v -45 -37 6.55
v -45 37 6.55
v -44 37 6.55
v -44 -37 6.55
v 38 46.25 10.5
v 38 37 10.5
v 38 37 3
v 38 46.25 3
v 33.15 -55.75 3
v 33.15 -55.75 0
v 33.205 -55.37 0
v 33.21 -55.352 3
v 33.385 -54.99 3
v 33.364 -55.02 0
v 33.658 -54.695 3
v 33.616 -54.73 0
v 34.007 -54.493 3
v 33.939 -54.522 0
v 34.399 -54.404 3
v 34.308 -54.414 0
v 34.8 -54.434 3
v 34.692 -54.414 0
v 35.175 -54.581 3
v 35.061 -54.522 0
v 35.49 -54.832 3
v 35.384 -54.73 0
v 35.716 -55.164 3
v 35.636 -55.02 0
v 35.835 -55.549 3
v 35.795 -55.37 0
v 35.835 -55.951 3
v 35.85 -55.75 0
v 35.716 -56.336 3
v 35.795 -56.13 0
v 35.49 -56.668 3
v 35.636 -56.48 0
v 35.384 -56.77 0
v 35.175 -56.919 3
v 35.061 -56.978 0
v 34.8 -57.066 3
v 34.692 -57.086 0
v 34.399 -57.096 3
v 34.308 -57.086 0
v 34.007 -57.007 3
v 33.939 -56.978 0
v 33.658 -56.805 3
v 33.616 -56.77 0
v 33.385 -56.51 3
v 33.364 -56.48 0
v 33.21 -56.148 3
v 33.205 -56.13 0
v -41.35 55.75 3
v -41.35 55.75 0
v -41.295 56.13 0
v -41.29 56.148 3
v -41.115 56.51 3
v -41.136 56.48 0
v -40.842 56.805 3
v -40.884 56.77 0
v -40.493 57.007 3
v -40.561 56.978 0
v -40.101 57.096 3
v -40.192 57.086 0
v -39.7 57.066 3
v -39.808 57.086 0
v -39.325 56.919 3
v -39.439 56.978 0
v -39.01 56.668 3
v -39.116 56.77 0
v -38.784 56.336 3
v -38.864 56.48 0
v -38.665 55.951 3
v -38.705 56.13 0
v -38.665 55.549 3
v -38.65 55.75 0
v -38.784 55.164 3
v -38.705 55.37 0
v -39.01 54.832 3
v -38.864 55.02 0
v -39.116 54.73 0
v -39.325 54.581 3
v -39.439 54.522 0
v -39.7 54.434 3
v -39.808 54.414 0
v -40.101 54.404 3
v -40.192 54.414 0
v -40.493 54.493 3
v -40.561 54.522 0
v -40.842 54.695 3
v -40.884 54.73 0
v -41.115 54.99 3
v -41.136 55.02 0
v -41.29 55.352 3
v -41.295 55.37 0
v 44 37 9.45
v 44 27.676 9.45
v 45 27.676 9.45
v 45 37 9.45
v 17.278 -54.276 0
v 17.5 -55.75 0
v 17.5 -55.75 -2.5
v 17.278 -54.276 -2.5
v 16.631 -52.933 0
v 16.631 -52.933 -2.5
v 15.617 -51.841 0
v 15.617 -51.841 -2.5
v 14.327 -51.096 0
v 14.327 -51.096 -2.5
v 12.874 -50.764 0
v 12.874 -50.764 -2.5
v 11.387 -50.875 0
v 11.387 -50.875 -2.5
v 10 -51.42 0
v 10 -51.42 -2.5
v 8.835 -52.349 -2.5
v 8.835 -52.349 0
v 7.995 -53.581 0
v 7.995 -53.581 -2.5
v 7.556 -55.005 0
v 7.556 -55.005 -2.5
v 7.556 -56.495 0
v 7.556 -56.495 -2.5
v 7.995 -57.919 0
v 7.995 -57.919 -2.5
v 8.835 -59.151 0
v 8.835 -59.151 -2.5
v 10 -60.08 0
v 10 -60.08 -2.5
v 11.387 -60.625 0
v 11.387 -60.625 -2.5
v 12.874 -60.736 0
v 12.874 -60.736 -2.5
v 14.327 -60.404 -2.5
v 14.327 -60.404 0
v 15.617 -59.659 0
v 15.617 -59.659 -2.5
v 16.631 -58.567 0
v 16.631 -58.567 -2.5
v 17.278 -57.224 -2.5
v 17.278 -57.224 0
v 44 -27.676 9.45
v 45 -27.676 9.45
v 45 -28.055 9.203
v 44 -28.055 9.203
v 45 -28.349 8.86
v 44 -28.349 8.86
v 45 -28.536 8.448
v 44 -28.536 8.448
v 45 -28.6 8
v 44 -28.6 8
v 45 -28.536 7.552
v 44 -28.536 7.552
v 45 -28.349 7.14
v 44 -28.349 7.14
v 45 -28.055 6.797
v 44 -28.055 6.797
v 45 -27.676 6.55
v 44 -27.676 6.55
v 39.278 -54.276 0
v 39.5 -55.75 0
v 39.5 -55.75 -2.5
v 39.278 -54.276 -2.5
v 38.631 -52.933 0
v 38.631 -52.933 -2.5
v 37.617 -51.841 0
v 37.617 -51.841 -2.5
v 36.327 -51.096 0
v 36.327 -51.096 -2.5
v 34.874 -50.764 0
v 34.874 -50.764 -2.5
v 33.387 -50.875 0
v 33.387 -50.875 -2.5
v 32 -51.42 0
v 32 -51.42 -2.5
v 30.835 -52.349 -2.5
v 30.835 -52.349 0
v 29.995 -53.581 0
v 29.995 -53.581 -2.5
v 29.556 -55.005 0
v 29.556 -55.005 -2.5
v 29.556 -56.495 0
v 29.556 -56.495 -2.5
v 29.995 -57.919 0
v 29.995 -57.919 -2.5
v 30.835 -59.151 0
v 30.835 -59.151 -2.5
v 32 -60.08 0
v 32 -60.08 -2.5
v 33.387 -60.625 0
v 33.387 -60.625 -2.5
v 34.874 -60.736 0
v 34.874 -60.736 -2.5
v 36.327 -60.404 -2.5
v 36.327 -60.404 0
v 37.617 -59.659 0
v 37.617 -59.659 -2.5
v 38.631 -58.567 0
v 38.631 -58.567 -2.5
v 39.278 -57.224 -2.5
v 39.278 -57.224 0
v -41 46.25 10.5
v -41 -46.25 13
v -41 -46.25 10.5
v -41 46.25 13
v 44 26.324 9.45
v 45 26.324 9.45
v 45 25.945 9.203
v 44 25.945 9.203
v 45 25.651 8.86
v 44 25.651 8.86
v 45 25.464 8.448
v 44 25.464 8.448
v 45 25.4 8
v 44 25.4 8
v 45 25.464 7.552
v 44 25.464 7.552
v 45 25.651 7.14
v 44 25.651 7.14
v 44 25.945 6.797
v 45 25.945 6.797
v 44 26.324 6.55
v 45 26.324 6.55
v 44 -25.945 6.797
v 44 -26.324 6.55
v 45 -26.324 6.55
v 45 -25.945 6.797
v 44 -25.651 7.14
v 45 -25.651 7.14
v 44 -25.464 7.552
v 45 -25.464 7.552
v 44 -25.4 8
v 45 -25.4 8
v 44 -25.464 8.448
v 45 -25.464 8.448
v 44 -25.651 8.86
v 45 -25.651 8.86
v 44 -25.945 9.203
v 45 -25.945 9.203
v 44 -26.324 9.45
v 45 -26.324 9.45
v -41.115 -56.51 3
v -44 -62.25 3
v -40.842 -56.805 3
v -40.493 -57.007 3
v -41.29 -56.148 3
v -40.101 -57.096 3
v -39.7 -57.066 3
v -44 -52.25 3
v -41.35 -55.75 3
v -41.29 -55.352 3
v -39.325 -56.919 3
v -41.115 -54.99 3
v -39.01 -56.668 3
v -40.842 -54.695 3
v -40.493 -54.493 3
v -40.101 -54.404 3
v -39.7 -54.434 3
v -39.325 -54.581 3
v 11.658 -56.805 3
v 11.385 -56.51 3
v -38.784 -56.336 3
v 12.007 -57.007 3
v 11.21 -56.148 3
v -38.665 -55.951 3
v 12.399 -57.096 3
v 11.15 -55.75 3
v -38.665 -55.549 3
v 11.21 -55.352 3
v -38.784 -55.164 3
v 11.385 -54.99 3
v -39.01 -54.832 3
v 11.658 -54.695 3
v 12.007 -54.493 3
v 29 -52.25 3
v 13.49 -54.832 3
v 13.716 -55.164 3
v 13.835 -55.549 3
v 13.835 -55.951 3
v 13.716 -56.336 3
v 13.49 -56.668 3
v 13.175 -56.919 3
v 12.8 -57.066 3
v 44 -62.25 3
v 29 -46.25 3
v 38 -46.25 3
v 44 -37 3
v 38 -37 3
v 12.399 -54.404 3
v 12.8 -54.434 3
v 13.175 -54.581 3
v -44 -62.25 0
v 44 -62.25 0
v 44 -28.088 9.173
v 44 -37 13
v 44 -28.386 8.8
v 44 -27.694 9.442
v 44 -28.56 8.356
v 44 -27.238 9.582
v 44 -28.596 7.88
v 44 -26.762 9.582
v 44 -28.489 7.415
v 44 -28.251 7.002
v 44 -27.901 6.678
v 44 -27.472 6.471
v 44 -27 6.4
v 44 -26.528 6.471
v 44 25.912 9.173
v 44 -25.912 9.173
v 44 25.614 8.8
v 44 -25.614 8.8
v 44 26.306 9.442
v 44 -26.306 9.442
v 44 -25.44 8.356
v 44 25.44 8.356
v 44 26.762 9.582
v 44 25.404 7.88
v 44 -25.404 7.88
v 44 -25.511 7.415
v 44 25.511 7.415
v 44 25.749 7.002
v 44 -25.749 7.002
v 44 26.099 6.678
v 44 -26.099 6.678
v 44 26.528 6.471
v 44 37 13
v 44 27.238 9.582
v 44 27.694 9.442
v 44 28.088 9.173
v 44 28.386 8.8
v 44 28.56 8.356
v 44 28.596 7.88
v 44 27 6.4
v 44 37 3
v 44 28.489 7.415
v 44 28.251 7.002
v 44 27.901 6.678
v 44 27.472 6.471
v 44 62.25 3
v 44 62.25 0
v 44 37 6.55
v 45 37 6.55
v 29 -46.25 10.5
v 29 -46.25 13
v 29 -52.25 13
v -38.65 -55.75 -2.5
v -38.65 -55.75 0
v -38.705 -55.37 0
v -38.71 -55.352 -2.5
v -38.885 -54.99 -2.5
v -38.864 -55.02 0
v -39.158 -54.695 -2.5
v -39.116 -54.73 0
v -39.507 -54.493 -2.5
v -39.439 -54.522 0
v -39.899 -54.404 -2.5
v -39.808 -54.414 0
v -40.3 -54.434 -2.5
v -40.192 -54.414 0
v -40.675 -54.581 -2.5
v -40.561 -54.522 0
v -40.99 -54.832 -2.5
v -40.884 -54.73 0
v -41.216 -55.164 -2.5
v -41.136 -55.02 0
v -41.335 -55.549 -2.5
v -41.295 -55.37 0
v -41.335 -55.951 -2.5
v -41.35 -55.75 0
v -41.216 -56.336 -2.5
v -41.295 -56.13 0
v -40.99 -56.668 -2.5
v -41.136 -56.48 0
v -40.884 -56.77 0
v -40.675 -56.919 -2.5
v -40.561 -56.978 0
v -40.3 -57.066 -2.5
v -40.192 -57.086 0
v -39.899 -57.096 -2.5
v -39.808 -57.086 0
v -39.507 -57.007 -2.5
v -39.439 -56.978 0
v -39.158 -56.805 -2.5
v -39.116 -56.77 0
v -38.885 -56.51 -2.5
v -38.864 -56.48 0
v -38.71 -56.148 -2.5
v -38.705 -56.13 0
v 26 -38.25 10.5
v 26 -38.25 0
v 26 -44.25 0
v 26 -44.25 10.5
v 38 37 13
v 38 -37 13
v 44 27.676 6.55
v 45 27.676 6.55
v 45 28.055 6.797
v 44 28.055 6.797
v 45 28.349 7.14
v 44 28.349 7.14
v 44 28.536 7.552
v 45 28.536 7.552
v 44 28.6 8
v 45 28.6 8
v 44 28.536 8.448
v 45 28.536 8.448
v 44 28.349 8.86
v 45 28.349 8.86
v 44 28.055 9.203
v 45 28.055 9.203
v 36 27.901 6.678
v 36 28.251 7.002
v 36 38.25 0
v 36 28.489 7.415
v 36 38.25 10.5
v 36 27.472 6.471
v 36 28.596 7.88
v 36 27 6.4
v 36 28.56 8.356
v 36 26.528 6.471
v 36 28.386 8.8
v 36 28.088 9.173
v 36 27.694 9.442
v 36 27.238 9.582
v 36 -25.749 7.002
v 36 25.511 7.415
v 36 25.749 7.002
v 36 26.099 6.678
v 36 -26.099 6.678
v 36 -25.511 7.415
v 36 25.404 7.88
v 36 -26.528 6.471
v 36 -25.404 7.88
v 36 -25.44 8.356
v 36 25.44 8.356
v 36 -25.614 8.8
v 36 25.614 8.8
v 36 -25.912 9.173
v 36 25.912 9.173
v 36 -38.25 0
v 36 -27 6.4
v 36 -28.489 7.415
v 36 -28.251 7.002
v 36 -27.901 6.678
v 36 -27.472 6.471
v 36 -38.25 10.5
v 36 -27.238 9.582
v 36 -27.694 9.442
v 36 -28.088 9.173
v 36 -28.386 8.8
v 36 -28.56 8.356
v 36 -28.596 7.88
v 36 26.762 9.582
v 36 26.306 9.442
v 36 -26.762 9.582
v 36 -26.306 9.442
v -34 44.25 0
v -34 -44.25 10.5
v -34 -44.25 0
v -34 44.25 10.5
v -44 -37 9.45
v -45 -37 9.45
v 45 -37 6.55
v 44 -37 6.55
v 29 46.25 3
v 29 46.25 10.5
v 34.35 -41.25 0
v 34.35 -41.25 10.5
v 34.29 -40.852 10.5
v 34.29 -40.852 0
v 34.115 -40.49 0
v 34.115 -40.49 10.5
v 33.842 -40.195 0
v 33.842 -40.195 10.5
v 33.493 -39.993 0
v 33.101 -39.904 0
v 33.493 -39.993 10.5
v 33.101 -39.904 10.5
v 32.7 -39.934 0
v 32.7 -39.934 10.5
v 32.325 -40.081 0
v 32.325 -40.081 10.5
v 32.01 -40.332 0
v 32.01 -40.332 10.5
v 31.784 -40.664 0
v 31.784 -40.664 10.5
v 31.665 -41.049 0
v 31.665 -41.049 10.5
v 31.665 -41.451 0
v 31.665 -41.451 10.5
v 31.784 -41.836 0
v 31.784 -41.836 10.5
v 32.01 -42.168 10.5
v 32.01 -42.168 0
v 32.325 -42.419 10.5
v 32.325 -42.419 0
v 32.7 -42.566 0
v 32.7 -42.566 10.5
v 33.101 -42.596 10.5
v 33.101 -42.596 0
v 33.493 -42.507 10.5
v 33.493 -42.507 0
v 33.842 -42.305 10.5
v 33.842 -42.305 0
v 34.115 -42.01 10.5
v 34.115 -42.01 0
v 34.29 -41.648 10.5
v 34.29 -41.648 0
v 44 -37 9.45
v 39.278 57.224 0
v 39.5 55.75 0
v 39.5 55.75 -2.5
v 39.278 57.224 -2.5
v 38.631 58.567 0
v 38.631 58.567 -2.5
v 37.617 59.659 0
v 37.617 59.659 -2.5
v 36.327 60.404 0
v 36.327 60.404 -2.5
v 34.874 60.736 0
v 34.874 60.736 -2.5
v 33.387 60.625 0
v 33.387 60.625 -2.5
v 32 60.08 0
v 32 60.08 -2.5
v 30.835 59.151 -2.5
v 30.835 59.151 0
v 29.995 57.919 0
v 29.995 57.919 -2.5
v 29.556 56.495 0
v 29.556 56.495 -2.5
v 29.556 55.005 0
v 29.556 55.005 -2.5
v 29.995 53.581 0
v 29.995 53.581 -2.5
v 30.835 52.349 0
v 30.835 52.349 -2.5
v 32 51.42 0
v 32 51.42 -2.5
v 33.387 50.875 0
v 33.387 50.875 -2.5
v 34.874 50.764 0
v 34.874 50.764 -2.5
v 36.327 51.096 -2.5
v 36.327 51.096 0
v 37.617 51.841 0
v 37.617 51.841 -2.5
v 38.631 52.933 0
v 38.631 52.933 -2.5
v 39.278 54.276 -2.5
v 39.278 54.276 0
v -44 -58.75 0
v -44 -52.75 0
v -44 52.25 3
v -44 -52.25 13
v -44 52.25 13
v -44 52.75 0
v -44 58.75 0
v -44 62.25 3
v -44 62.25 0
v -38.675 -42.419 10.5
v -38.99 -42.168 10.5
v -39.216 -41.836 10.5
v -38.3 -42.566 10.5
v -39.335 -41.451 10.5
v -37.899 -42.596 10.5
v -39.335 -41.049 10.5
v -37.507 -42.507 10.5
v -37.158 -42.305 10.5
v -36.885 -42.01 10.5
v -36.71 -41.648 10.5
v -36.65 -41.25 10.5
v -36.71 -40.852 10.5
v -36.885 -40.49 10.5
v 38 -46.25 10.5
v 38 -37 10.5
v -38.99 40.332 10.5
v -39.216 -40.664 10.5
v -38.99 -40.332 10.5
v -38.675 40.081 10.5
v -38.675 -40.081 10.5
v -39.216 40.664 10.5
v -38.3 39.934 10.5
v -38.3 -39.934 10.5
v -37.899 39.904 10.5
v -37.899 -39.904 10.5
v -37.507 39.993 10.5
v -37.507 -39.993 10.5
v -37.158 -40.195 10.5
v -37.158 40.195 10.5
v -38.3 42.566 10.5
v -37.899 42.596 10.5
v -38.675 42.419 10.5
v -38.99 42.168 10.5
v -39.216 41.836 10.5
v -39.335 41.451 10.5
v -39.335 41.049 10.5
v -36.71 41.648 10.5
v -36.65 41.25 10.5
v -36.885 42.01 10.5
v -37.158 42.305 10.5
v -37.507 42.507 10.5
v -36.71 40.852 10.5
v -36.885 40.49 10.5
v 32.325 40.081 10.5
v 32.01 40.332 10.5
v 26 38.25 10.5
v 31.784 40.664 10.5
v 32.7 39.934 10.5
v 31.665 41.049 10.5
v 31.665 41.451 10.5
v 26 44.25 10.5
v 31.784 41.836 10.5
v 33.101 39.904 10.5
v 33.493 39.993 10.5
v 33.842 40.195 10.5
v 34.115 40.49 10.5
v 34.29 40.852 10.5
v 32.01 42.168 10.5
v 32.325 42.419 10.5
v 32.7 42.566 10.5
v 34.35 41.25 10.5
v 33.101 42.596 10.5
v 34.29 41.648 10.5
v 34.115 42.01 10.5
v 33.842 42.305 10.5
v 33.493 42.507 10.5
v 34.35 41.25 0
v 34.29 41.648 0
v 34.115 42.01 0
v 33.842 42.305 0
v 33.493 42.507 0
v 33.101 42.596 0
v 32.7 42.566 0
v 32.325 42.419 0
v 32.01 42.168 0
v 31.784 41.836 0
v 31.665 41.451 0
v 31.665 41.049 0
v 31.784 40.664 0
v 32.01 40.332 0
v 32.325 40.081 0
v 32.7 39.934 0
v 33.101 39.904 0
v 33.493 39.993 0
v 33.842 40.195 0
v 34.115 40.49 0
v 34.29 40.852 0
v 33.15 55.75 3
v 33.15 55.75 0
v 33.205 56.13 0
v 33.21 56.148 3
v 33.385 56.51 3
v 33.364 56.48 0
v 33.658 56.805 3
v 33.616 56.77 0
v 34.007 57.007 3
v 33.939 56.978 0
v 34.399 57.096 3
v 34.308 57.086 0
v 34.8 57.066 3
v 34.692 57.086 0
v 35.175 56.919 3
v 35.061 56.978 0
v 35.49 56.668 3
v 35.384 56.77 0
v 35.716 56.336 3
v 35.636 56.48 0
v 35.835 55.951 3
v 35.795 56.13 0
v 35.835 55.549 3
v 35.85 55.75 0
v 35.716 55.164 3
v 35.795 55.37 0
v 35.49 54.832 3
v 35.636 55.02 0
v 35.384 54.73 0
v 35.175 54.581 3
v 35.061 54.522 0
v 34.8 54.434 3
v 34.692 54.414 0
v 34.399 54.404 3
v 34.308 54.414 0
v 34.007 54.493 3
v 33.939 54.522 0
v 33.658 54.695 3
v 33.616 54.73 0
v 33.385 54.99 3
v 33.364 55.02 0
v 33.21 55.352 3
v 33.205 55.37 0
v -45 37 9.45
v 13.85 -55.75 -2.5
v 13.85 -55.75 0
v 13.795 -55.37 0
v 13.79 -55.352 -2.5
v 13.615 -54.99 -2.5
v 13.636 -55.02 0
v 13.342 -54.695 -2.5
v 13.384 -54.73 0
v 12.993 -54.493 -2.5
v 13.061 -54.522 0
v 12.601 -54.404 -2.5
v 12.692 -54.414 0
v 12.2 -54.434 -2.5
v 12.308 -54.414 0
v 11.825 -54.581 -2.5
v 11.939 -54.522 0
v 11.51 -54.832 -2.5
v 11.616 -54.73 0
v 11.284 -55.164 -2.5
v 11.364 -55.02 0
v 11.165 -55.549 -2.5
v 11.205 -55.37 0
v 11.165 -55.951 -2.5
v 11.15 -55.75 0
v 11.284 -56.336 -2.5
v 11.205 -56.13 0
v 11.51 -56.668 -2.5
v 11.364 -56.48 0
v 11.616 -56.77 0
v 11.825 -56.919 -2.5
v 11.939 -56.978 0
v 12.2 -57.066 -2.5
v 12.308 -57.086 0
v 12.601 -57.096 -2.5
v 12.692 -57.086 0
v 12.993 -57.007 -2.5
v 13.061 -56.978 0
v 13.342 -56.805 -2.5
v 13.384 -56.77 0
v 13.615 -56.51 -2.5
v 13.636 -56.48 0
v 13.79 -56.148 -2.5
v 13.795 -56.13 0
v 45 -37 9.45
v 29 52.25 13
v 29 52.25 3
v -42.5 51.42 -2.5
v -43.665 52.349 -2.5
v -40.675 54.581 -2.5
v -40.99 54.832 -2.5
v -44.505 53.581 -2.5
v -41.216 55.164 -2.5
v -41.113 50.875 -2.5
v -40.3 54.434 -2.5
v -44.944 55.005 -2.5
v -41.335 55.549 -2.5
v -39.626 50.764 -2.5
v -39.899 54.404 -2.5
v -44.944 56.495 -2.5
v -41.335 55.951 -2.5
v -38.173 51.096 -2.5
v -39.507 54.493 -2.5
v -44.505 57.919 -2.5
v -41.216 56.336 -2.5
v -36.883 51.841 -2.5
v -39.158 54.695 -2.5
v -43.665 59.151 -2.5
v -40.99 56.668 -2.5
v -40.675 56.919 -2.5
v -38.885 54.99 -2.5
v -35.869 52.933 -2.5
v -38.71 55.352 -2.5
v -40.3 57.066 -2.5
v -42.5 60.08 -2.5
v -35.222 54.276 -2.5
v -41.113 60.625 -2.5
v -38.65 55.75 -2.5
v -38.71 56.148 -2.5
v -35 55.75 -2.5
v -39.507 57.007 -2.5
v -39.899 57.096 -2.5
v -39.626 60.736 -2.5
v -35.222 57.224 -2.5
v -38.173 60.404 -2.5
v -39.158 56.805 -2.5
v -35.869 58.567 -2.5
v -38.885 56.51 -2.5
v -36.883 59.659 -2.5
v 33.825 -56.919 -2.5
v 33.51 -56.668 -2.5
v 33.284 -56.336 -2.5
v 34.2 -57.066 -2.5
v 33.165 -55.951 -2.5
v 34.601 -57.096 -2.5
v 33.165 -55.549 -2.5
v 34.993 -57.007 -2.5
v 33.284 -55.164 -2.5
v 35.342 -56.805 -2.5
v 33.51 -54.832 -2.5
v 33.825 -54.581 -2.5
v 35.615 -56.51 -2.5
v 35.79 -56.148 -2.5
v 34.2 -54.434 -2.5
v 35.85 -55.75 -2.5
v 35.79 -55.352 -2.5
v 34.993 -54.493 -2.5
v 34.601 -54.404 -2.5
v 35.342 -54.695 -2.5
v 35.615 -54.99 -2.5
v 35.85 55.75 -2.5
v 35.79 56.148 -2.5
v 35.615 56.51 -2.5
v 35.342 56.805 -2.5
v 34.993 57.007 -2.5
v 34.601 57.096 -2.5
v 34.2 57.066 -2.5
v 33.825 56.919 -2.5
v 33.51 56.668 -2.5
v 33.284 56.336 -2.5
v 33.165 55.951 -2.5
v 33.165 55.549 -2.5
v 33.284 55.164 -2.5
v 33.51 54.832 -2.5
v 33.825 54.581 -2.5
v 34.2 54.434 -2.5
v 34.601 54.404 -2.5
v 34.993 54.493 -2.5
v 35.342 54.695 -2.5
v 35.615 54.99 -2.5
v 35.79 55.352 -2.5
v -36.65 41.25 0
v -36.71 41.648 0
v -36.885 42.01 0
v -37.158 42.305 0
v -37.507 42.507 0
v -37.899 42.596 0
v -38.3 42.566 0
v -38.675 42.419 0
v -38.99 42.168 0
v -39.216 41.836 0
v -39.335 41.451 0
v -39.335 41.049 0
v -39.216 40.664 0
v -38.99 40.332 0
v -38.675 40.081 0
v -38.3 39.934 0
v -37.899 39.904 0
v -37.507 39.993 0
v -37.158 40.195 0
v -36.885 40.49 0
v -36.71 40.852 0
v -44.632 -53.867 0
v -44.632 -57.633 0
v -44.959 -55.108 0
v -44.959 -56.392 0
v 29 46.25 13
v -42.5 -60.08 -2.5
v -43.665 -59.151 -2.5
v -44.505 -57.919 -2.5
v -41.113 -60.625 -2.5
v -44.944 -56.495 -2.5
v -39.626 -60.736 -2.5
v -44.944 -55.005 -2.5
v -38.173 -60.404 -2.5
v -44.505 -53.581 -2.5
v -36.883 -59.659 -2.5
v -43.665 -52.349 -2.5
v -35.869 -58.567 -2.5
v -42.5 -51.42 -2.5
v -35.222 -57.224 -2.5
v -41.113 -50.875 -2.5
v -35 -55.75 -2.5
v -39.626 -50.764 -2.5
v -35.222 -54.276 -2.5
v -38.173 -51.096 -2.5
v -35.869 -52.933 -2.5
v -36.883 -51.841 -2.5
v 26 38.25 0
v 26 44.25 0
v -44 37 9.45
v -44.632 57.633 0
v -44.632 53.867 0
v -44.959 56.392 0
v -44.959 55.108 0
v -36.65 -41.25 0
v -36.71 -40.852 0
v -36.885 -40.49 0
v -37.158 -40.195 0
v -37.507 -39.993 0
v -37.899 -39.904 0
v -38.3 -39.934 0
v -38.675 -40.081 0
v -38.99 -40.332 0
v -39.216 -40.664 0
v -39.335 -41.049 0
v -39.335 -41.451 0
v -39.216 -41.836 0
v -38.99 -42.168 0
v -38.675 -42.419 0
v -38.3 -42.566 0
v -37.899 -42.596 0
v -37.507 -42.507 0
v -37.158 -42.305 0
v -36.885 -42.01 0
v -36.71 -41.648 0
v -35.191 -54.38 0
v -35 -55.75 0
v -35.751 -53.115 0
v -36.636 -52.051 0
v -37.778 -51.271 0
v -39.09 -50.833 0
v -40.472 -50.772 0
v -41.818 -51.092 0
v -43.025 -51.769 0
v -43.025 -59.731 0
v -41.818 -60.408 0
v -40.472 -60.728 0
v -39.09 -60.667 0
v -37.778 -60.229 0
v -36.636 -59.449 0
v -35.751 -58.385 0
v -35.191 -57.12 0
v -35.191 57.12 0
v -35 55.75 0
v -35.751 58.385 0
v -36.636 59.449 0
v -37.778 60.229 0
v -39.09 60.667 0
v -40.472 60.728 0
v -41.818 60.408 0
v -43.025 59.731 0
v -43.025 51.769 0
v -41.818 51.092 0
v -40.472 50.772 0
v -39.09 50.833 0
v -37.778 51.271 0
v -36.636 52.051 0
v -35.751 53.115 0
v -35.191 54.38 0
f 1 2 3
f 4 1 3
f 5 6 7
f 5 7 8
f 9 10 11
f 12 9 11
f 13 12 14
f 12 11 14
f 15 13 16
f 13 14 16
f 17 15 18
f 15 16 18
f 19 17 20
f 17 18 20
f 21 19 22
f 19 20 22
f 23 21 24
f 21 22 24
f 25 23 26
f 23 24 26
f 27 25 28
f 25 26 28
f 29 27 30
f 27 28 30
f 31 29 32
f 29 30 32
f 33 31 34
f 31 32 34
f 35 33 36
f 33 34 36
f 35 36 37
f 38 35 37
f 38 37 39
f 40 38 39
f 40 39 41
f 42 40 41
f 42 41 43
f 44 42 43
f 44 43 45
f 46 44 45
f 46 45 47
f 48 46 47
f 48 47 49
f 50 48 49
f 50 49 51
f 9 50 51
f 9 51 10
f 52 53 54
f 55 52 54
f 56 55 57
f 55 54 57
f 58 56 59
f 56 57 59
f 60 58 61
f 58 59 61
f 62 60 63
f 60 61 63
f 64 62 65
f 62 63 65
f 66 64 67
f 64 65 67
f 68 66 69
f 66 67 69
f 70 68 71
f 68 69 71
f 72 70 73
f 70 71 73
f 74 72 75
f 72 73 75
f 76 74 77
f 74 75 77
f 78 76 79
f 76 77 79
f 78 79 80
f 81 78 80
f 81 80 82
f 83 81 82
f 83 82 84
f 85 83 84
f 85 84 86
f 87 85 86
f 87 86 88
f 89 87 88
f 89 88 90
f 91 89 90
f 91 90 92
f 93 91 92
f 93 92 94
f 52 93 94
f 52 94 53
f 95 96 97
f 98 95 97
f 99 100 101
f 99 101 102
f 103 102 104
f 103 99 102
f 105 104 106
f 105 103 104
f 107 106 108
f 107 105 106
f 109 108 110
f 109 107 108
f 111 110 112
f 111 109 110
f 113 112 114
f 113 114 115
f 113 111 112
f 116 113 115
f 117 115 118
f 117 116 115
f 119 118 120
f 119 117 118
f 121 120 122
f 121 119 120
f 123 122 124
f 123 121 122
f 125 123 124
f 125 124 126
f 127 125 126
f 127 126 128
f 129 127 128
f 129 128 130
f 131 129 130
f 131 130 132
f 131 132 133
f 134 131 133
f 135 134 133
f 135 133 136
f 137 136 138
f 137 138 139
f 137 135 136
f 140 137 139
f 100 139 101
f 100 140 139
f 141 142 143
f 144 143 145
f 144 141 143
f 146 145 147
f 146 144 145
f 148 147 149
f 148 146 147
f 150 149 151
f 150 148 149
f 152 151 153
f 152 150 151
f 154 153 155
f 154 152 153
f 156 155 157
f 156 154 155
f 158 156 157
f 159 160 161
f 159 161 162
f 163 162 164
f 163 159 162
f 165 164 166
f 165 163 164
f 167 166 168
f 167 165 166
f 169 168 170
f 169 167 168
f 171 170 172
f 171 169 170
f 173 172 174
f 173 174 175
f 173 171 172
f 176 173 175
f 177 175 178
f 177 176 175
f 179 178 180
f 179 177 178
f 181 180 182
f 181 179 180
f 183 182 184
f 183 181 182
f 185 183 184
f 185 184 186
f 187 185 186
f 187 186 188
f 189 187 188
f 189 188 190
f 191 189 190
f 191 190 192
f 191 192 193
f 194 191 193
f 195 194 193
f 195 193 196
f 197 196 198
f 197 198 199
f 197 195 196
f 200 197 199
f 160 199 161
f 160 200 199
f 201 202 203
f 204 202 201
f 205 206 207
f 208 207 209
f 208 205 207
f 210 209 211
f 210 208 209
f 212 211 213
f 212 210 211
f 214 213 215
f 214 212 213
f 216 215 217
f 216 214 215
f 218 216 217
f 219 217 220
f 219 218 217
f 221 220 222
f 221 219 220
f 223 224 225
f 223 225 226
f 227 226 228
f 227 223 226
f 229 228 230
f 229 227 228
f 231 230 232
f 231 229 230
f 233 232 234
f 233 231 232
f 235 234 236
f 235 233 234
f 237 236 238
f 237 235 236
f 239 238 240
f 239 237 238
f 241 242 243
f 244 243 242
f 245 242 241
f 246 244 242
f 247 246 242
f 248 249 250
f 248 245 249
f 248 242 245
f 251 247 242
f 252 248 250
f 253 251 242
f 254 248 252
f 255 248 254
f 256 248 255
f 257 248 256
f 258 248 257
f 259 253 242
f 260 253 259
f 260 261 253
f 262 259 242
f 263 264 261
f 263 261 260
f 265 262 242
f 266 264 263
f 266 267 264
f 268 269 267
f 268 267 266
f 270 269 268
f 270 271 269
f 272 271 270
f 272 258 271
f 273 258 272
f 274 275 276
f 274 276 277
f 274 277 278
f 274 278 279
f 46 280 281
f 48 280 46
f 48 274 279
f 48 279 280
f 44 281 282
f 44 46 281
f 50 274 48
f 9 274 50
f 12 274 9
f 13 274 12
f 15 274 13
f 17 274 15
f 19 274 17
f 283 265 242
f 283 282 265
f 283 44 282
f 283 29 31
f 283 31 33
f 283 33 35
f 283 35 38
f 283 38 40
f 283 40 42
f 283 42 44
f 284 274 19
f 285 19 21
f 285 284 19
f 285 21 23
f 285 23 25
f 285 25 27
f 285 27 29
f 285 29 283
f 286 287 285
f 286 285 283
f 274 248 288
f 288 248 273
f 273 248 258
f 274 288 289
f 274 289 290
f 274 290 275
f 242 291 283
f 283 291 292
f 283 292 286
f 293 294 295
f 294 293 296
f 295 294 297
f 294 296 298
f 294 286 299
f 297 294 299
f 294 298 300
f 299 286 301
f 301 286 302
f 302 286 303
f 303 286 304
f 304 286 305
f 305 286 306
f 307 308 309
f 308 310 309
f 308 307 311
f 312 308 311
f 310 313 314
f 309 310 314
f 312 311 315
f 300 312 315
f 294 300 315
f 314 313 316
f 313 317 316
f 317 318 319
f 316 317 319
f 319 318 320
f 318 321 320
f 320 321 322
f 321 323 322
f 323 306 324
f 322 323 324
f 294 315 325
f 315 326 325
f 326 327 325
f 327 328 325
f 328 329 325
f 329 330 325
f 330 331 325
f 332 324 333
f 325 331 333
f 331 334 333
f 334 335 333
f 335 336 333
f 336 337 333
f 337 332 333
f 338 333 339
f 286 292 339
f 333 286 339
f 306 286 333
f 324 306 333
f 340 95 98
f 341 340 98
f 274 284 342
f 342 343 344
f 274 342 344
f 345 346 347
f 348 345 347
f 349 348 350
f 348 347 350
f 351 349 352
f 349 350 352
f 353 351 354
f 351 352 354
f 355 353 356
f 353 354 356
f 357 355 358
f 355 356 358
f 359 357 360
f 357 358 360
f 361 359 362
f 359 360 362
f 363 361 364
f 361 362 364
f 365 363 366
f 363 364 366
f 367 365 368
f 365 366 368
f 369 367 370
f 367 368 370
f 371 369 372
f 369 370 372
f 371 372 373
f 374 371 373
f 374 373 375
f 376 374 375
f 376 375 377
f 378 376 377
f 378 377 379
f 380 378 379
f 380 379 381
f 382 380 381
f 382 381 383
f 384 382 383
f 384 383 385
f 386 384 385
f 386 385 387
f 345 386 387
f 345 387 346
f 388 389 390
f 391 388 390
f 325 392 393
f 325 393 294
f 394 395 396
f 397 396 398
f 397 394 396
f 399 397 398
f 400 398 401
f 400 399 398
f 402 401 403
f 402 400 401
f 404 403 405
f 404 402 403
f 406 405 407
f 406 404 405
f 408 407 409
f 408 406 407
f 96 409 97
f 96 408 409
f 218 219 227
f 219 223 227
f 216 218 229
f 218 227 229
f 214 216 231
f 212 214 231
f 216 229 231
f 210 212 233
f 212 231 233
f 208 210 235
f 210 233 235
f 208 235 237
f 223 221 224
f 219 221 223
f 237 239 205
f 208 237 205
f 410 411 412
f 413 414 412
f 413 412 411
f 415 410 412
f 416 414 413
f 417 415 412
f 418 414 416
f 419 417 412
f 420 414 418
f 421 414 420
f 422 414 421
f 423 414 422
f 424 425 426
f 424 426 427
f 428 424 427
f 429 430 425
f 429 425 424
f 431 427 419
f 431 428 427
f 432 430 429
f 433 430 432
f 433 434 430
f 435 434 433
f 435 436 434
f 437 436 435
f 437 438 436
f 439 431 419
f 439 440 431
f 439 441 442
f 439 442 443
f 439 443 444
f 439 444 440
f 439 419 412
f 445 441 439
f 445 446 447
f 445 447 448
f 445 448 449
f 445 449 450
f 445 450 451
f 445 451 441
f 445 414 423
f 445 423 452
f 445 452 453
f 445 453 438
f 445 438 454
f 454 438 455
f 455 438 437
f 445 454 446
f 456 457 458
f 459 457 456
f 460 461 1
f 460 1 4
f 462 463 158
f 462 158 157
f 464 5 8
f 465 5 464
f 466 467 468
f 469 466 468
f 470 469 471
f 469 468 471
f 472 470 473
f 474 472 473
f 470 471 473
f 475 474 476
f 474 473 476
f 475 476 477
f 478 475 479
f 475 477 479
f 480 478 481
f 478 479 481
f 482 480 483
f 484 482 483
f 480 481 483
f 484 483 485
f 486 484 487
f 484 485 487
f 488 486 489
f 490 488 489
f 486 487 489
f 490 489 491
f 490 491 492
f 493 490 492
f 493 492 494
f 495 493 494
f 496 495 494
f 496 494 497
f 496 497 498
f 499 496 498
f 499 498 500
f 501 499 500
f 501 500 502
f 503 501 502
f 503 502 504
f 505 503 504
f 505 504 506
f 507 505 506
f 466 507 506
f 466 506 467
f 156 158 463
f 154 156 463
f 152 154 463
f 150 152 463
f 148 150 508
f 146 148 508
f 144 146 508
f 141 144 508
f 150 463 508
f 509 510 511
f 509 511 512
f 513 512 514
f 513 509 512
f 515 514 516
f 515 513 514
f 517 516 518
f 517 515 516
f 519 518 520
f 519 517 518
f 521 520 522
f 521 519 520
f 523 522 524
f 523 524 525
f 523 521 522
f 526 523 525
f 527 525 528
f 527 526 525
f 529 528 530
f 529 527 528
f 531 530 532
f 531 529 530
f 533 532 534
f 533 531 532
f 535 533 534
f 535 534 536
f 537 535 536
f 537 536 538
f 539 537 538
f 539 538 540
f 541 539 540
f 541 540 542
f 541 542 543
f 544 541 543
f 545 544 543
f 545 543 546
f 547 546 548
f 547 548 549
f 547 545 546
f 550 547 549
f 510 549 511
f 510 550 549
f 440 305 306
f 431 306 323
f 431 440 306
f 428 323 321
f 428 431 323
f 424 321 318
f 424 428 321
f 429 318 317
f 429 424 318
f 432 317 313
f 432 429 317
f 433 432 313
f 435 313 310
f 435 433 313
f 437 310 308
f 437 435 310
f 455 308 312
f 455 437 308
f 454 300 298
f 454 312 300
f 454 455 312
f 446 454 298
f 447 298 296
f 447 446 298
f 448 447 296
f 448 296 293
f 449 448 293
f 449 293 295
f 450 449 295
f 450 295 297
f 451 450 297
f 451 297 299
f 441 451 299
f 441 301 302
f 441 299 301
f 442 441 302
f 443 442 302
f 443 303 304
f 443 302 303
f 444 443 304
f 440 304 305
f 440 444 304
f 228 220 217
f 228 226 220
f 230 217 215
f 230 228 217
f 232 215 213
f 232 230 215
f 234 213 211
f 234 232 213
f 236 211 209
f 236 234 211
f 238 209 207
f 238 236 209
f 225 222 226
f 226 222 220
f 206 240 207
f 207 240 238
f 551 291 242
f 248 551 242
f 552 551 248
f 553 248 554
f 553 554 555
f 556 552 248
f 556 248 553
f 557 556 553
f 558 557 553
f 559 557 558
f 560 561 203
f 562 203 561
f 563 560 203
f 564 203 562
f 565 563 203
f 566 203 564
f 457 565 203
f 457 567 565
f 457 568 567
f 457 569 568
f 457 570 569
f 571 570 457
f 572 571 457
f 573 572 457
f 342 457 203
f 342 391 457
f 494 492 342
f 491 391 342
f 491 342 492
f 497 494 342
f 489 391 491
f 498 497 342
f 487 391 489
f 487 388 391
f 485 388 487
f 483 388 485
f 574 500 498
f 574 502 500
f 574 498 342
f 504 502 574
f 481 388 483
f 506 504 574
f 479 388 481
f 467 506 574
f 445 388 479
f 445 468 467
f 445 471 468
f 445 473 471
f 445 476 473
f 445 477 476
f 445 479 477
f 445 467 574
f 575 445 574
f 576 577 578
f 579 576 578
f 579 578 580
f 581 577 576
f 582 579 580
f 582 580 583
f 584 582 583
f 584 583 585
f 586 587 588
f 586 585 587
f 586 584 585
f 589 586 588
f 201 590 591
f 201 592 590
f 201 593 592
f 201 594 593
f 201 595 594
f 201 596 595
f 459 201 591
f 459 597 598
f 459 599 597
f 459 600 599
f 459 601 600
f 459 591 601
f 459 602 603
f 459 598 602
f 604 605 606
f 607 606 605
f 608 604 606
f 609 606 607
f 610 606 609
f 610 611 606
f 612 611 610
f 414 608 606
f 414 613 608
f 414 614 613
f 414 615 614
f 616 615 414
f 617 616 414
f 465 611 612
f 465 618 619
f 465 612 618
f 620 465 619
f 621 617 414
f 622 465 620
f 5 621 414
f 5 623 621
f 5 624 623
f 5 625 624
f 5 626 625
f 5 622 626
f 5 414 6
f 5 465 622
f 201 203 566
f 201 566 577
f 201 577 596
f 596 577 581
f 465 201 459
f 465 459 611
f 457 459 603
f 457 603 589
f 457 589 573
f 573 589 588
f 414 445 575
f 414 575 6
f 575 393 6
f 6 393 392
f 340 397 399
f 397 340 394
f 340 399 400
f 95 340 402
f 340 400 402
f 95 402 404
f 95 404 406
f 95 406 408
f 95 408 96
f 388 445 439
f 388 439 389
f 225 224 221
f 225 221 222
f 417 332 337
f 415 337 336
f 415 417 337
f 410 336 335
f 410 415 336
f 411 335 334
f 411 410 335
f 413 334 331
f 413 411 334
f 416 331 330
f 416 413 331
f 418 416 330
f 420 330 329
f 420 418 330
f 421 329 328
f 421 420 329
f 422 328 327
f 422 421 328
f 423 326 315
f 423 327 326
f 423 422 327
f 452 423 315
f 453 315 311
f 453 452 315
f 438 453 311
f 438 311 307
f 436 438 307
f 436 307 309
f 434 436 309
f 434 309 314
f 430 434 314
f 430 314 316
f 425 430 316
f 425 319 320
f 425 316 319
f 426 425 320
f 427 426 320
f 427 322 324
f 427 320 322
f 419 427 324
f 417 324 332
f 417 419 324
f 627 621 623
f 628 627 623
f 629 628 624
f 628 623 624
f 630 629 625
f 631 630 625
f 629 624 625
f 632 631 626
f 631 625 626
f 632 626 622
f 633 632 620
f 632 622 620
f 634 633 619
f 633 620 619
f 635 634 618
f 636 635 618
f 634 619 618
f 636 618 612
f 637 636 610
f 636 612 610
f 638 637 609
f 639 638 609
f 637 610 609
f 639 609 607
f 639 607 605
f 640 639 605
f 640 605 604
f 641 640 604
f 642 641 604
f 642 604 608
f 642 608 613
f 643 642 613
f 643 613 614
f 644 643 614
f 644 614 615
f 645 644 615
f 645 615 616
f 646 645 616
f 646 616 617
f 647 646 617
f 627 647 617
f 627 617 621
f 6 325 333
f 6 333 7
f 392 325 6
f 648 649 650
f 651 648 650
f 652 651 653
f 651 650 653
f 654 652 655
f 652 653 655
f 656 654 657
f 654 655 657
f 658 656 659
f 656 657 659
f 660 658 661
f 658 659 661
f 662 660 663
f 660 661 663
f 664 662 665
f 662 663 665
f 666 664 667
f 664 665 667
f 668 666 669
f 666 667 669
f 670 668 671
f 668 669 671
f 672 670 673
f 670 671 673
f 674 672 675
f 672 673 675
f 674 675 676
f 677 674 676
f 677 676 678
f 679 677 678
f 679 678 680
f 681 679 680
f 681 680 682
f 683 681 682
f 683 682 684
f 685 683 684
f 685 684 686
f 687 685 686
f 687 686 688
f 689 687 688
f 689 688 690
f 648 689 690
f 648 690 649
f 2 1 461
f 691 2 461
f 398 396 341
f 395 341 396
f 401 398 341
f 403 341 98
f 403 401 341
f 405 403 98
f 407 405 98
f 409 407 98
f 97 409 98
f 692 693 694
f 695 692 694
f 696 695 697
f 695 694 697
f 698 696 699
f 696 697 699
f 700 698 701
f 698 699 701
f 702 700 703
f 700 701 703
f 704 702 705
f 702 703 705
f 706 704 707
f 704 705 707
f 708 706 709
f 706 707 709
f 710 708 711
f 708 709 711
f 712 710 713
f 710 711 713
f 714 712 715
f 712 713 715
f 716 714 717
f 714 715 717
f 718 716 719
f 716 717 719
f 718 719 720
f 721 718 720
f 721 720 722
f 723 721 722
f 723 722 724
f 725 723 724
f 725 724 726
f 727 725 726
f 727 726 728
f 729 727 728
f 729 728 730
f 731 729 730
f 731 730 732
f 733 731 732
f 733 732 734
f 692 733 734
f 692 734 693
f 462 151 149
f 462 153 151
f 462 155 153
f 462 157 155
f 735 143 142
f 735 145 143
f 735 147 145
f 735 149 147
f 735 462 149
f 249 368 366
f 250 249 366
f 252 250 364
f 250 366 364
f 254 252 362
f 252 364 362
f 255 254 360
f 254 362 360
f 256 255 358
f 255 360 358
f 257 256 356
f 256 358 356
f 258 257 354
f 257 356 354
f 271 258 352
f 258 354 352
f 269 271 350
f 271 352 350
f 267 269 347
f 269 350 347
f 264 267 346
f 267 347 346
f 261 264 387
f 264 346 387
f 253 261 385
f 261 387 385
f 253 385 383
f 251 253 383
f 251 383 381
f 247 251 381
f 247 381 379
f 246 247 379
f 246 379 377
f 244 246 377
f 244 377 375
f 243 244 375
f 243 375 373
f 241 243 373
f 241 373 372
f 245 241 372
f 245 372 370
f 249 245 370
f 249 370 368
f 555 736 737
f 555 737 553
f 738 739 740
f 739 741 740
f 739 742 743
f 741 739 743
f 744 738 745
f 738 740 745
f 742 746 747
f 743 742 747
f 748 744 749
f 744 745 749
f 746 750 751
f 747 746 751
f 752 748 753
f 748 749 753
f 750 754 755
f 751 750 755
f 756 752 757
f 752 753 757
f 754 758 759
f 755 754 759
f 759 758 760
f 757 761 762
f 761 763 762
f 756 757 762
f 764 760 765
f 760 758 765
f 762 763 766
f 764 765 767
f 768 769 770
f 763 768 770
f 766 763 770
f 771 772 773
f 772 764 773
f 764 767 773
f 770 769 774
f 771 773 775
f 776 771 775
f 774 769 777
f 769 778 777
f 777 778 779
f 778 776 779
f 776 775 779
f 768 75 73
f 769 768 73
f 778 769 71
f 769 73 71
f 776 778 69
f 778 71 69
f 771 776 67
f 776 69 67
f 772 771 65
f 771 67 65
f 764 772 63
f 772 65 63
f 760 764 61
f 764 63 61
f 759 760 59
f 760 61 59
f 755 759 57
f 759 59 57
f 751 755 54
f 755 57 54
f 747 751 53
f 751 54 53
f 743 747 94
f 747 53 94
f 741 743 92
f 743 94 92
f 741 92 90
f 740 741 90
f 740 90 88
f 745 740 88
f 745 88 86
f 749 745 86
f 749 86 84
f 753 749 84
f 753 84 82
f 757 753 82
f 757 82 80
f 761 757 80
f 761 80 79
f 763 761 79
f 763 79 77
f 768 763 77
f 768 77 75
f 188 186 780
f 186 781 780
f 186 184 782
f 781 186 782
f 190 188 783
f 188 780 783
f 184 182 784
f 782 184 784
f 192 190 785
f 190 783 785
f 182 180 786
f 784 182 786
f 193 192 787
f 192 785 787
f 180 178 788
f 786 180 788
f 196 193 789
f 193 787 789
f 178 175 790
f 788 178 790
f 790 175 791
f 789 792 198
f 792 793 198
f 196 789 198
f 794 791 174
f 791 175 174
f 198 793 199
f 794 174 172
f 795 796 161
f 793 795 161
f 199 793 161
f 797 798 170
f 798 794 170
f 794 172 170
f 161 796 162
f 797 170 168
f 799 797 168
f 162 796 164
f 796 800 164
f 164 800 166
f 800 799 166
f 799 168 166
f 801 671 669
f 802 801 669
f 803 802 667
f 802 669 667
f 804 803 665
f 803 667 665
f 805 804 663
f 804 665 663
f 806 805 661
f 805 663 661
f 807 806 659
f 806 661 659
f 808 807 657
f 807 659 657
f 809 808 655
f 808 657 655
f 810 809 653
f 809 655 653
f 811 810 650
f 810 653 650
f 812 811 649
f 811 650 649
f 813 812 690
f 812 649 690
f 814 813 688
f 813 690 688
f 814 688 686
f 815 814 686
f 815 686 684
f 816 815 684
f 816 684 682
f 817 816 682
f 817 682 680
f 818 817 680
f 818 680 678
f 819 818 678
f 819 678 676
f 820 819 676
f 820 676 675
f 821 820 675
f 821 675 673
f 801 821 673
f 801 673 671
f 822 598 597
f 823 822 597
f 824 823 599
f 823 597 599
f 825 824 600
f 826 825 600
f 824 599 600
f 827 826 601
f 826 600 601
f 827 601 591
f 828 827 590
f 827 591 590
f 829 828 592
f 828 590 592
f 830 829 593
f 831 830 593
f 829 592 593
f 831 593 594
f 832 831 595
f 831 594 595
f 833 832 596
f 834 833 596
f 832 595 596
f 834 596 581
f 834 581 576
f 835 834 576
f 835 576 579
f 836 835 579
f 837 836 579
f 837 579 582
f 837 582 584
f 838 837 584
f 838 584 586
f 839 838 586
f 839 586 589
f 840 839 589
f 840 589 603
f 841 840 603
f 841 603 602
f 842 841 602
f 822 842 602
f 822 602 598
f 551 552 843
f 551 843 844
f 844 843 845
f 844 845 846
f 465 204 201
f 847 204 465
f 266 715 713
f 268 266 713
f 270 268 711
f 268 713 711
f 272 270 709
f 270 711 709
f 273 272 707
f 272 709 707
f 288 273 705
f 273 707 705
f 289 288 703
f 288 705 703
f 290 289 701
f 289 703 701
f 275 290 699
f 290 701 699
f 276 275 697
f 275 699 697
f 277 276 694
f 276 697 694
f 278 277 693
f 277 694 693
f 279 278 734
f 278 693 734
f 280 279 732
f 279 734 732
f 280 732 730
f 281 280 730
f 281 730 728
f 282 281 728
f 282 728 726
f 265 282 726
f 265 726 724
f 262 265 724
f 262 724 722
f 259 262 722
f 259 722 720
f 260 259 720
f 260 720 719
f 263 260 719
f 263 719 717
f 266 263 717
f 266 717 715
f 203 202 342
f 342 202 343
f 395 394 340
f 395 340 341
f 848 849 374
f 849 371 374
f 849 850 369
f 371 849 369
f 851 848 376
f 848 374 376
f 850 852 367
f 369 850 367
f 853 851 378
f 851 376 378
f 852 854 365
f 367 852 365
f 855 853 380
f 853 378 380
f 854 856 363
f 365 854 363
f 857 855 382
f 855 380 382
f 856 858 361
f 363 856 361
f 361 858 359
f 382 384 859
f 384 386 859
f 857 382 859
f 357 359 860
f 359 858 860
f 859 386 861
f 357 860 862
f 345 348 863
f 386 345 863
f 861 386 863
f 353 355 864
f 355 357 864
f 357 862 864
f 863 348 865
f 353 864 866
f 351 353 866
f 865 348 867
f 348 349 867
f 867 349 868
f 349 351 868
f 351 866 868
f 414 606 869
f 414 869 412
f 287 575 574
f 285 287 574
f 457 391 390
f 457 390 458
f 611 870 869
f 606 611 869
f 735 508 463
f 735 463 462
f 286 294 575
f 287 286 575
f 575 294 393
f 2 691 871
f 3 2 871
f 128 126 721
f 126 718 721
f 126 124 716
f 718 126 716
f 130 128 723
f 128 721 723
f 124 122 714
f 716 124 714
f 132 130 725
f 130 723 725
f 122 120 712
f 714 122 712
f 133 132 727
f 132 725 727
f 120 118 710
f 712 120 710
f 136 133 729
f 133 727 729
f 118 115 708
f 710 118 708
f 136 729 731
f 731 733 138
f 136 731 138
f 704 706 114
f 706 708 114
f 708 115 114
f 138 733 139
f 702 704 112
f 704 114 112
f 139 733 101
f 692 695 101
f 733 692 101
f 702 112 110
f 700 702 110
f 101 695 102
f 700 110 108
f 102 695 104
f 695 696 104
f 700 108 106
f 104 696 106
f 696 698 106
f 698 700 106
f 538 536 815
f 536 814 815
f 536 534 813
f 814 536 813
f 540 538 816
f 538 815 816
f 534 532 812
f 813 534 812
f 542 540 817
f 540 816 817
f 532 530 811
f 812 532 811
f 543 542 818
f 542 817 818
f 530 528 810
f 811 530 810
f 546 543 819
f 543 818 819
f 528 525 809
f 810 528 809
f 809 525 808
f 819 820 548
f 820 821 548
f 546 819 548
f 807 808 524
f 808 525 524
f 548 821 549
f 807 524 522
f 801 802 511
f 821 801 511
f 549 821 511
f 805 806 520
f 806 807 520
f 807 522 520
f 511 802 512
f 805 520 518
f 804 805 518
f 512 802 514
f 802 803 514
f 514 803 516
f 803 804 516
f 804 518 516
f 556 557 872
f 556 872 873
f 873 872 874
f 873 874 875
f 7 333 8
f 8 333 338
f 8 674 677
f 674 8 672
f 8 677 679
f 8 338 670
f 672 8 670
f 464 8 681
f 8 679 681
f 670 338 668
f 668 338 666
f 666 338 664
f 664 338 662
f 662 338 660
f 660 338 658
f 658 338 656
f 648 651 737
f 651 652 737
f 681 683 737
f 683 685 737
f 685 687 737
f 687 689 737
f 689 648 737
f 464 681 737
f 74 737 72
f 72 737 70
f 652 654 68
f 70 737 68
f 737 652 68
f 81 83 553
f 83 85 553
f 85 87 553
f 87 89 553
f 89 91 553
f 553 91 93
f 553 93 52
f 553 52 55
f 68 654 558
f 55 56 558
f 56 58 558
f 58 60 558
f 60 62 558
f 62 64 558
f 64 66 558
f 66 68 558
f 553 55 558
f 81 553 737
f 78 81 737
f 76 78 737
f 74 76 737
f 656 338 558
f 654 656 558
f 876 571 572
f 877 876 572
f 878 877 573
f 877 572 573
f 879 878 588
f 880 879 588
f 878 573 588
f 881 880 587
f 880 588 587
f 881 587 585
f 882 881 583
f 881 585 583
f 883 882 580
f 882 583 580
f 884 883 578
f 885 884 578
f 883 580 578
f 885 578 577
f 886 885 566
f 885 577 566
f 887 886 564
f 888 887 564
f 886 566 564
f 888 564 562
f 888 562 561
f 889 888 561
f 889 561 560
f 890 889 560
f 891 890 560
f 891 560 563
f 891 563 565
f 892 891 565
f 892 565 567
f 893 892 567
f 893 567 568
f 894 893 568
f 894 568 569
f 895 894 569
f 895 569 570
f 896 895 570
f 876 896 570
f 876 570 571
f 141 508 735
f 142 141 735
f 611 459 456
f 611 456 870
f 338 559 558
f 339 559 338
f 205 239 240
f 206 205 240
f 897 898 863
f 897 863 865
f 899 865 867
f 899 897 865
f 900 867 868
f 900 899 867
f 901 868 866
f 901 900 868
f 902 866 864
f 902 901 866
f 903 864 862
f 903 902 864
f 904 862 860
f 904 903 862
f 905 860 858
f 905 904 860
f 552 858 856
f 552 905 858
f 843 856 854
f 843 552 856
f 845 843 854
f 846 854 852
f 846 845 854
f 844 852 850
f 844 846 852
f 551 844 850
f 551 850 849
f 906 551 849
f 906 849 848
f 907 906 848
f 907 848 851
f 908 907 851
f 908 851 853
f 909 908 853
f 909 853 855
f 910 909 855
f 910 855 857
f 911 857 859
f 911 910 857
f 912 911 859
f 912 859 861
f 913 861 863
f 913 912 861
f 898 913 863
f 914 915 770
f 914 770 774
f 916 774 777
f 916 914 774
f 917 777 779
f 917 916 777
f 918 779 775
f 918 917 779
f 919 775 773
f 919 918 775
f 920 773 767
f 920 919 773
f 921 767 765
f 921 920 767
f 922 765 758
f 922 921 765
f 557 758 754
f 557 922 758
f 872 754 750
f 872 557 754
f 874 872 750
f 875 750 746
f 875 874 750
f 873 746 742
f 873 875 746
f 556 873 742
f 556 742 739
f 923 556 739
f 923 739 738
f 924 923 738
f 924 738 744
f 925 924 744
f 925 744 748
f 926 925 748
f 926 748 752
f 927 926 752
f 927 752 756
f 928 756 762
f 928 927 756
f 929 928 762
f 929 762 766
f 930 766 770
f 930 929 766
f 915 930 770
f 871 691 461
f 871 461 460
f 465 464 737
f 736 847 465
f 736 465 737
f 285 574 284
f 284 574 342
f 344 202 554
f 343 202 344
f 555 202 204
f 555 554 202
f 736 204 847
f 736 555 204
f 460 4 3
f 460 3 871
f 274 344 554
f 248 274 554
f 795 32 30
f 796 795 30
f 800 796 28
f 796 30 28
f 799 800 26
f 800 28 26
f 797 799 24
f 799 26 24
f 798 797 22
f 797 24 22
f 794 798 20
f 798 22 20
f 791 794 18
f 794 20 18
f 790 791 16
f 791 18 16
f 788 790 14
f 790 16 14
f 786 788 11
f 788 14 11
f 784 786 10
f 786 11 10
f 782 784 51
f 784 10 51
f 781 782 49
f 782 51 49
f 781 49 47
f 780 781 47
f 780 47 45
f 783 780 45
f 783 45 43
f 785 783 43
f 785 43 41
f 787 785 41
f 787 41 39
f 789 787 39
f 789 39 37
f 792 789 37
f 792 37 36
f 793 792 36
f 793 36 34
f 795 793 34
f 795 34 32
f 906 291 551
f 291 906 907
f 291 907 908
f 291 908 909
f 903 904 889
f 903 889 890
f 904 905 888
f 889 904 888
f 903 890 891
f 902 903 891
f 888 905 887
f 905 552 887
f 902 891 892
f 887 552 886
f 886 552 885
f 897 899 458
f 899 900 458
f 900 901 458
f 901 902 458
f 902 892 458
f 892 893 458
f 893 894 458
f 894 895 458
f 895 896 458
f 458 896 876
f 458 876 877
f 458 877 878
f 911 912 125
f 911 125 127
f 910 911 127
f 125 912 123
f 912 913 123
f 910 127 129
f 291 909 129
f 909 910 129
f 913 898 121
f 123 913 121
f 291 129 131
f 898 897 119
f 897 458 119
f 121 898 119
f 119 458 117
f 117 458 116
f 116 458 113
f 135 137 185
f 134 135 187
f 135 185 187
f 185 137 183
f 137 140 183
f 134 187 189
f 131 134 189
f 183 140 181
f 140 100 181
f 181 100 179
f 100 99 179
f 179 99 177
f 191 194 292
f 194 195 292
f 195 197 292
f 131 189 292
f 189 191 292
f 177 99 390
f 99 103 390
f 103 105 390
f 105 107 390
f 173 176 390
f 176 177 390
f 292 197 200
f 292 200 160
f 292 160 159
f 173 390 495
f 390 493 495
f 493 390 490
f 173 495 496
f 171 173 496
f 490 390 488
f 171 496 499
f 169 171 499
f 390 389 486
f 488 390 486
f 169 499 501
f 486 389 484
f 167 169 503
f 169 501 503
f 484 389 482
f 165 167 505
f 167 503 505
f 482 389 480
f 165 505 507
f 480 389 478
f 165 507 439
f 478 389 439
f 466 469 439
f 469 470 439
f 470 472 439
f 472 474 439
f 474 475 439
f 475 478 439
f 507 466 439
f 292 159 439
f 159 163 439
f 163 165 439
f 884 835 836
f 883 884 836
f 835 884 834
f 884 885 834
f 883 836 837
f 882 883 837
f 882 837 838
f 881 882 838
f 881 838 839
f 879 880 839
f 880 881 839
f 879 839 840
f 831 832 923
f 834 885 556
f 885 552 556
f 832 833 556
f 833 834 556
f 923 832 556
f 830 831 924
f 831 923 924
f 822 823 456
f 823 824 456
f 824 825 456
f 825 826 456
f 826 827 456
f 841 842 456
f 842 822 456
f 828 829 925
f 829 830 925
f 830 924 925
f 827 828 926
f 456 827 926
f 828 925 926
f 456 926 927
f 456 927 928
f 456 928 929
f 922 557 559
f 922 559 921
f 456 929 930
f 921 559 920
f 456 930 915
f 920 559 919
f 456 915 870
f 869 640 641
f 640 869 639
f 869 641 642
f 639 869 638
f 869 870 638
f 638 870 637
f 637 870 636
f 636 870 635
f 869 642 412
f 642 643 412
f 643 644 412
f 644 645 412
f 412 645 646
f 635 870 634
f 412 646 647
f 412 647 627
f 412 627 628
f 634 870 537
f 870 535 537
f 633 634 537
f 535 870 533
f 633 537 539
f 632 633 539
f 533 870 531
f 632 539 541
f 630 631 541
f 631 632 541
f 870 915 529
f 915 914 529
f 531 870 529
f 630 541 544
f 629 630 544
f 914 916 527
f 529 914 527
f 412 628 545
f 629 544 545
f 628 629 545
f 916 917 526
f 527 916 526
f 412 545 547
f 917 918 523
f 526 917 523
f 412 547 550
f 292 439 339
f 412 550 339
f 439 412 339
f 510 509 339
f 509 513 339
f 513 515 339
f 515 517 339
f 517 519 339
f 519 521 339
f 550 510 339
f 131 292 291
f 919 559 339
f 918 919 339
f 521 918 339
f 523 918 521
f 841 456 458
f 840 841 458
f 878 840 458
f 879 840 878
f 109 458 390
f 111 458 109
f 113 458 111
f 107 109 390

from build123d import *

# Parameters (mm, degrees)
MAIN_SKETCH_W                = 88
MAIN_SKETCH_H                = 124.5
MAIN_EXTRUSION_DEPTH         = 13
FIX_SKETCH_R                 = 5
FIX_SKETCH_R_2               = 1.35
BOARD_PLOT_DEPTH             = 2.5
ESQUISSE1_R                  = 1.35
BOARD_PLOT_HOLE_DEPTH        = 14
ESQUISSE2_W                  = 1
ESQUISSE2_H                  = 2.9
MAKERBEAM_FIXING_DEPTH       = 37
MAKERBEAM_FIXING_2_DEPTH     = 37
WINDOW_HOLE_DEPTH            = 16.5
EXTERNAL_HOLE_DEPTH          = 10
MAKERBEAM_START              = -9
ESQUISSE5_R                  = 1.6
MAKERBEAM_FIXING_HOLE_DEPTH  = 9
ESQUISSE7_W                  = 79
ESQUISSE7_H                  = 92.5
GLASS_HOLE_DEPTH             = 2.5
ESQUISSE8_R                  = 1.35
GLASS_FIXING_HOLE_DEPTH      = 3.5
GLASS_FIXING_HOLE_DEPTH_BACK = 14


with BuildPart() as part:
    # Main-Sketch → Main-Extrusion (new body)
    with BuildSketch(Plane.XY):
        Rectangle(MAIN_SKETCH_W, MAIN_SKETCH_H)
    extrude(amount=MAIN_EXTRUSION_DEPTH)

    # Fix-Sketch → Board Plot (add)
    with BuildSketch(Plane.XY):
        with Locations((-40, 55.75)):
            Circle(FIX_SKETCH_R)
        with Locations((-40, 55.75)):
            Circle(FIX_SKETCH_R_2, mode=Mode.SUBTRACT)
        with Locations((34.5, 55.75)):
            Circle(FIX_SKETCH_R)
        with Locations((34.5, 55.75)):
            Circle(FIX_SKETCH_R_2, mode=Mode.SUBTRACT)
        with Locations((34.5, -55.75)):
            Circle(FIX_SKETCH_R)
        with Locations((34.5, -55.75)):
            Circle(FIX_SKETCH_R_2, mode=Mode.SUBTRACT)
        with Locations((-40, -55.75)):
            Circle(FIX_SKETCH_R)
        with Locations((-40, -55.75)):
            Circle(FIX_SKETCH_R_2, mode=Mode.SUBTRACT)
        with Locations((12.5, -55.75)):
            Circle(FIX_SKETCH_R)
        with Locations((12.5, -55.75)):
            Circle(FIX_SKETCH_R_2, mode=Mode.SUBTRACT)
    extrude(amount=-BOARD_PLOT_DEPTH)

    # Esquisse1 → Board Plot Hole (cut, through all)
    with BuildSketch(Plane(origin=(0, 0, 0), x_dir=(-1, 0, 0), z_dir=(0, 0, -1))):
        with Locations((-34.5, 55.75)):
            Circle(ESQUISSE1_R)
        with Locations((40, 55.75)):
            Circle(ESQUISSE1_R)
        with Locations((40, -55.75)):
            Circle(ESQUISSE1_R)
        with Locations((-12.5, -55.75)):
            Circle(ESQUISSE1_R)
        with Locations((-34.5, -55.75)):
            Circle(ESQUISSE1_R)
    extrude(amount=-BOARD_PLOT_HOLE_DEPTH, mode=Mode.SUBTRACT)

    # Esquisse3 → Window Hole (cut, through all)
    with BuildSketch(Plane.XY.offset(13)):
        Polygon((-34, 44.25), (26, 44.25), (26, 38.25), (36, 38.25), (36, -38.25), (26, -38.25), (26, -44.25), (-34, -44.25), align=None)
    extrude(amount=-WINDOW_HOLE_DEPTH, mode=Mode.SUBTRACT)

    # Esquisse4 → External Hole (cut)
    with BuildSketch(Plane.XY.offset(13)):
        Polygon((44, 62.25), (44, 37), (38, 37), (38, 46.25), (29, 46.25), (29, 52.25), (-44, 52.25), (-44, 62.25), align=None)
        Polygon((44, -62.25), (44, -37), (38, -37), (38, -46.25), (29, -46.25), (29, -52.25), (-44, -52.25), (-44, -62.25), align=None)
    extrude(amount=-EXTERNAL_HOLE_DEPTH, mode=Mode.SUBTRACT)


with BuildPart() as body_2:
    # Esquisse2 → MakerBeam Fixing (new body, symmetric)
    with BuildSketch(Plane.XZ):
        with Locations((44.5, 8)):
            Rectangle(ESQUISSE2_W, ESQUISSE2_H)
    extrude(amount=MAKERBEAM_FIXING_DEPTH, both=True)


with BuildPart() as body_3:
    # Esquisse2 → MakerBeam Fixing 2 (new body, symmetric)
    with BuildSketch(Plane.XZ):
        with Locations((-44.5, 8)):
            Rectangle(ESQUISSE2_W, ESQUISSE2_H)
    extrude(amount=MAKERBEAM_FIXING_2_DEPTH, both=True)


with BuildPart() as makerbeam_fixing_hole_tool:
    # Esquisse5 → MakerBeam Fixing Hole (new body)
    with BuildSketch(Plane(origin=(45, 0, 0), x_dir=(0, 0, -1), z_dir=(1, 0, 0)).offset(MAKERBEAM_START)):
        with Locations((-8, 27)):
            Circle(ESQUISSE5_R)
        with Locations((-8, -27)):
            Circle(ESQUISSE5_R)
    extrude(amount=MAKERBEAM_FIXING_HOLE_DEPTH)


with BuildPart() as part_1:
    add(part.part)

    # MakerBeam Fixing Hole: cut by makerbeam_fixing_hole_tool
    add(makerbeam_fixing_hole_tool.part, mode=Mode.SUBTRACT)

    # Esquisse7 → Glass Hole (cut)
    with BuildSketch(Plane.XY.offset(13)):
        with Locations((-1.5, 0)):
            Rectangle(ESQUISSE7_W, ESQUISSE7_H)
    extrude(amount=-GLASS_HOLE_DEPTH, mode=Mode.SUBTRACT)

    # Esquisse8 → Glass Fixing Hole (cut, two sides)
    with BuildSketch(Plane.XY.offset(10.5)) as glass_fixing_hole_sk:
        with Locations((-38, 41.25)):
            Circle(ESQUISSE8_R)
        with Locations((33, 41.25)):
            Circle(ESQUISSE8_R)
        with Locations((33, -41.25)):
            Circle(ESQUISSE8_R)
        with Locations((-38, -41.25)):
            Circle(ESQUISSE8_R)
    extrude(amount=GLASS_FIXING_HOLE_DEPTH, mode=Mode.SUBTRACT)
    extrude(glass_fixing_hole_sk.sketch, amount=-GLASS_FIXING_HOLE_DEPTH_BACK, mode=Mode.SUBTRACT)


with BuildPart() as body_2_1:
    add(body_2.part)

    # MakerBeam Fixing Hole: cut by makerbeam_fixing_hole_tool
    add(makerbeam_fixing_hole_tool.part, mode=Mode.SUBTRACT)


solid = Compound([body_3.part, part_1.part, body_2_1.part])
